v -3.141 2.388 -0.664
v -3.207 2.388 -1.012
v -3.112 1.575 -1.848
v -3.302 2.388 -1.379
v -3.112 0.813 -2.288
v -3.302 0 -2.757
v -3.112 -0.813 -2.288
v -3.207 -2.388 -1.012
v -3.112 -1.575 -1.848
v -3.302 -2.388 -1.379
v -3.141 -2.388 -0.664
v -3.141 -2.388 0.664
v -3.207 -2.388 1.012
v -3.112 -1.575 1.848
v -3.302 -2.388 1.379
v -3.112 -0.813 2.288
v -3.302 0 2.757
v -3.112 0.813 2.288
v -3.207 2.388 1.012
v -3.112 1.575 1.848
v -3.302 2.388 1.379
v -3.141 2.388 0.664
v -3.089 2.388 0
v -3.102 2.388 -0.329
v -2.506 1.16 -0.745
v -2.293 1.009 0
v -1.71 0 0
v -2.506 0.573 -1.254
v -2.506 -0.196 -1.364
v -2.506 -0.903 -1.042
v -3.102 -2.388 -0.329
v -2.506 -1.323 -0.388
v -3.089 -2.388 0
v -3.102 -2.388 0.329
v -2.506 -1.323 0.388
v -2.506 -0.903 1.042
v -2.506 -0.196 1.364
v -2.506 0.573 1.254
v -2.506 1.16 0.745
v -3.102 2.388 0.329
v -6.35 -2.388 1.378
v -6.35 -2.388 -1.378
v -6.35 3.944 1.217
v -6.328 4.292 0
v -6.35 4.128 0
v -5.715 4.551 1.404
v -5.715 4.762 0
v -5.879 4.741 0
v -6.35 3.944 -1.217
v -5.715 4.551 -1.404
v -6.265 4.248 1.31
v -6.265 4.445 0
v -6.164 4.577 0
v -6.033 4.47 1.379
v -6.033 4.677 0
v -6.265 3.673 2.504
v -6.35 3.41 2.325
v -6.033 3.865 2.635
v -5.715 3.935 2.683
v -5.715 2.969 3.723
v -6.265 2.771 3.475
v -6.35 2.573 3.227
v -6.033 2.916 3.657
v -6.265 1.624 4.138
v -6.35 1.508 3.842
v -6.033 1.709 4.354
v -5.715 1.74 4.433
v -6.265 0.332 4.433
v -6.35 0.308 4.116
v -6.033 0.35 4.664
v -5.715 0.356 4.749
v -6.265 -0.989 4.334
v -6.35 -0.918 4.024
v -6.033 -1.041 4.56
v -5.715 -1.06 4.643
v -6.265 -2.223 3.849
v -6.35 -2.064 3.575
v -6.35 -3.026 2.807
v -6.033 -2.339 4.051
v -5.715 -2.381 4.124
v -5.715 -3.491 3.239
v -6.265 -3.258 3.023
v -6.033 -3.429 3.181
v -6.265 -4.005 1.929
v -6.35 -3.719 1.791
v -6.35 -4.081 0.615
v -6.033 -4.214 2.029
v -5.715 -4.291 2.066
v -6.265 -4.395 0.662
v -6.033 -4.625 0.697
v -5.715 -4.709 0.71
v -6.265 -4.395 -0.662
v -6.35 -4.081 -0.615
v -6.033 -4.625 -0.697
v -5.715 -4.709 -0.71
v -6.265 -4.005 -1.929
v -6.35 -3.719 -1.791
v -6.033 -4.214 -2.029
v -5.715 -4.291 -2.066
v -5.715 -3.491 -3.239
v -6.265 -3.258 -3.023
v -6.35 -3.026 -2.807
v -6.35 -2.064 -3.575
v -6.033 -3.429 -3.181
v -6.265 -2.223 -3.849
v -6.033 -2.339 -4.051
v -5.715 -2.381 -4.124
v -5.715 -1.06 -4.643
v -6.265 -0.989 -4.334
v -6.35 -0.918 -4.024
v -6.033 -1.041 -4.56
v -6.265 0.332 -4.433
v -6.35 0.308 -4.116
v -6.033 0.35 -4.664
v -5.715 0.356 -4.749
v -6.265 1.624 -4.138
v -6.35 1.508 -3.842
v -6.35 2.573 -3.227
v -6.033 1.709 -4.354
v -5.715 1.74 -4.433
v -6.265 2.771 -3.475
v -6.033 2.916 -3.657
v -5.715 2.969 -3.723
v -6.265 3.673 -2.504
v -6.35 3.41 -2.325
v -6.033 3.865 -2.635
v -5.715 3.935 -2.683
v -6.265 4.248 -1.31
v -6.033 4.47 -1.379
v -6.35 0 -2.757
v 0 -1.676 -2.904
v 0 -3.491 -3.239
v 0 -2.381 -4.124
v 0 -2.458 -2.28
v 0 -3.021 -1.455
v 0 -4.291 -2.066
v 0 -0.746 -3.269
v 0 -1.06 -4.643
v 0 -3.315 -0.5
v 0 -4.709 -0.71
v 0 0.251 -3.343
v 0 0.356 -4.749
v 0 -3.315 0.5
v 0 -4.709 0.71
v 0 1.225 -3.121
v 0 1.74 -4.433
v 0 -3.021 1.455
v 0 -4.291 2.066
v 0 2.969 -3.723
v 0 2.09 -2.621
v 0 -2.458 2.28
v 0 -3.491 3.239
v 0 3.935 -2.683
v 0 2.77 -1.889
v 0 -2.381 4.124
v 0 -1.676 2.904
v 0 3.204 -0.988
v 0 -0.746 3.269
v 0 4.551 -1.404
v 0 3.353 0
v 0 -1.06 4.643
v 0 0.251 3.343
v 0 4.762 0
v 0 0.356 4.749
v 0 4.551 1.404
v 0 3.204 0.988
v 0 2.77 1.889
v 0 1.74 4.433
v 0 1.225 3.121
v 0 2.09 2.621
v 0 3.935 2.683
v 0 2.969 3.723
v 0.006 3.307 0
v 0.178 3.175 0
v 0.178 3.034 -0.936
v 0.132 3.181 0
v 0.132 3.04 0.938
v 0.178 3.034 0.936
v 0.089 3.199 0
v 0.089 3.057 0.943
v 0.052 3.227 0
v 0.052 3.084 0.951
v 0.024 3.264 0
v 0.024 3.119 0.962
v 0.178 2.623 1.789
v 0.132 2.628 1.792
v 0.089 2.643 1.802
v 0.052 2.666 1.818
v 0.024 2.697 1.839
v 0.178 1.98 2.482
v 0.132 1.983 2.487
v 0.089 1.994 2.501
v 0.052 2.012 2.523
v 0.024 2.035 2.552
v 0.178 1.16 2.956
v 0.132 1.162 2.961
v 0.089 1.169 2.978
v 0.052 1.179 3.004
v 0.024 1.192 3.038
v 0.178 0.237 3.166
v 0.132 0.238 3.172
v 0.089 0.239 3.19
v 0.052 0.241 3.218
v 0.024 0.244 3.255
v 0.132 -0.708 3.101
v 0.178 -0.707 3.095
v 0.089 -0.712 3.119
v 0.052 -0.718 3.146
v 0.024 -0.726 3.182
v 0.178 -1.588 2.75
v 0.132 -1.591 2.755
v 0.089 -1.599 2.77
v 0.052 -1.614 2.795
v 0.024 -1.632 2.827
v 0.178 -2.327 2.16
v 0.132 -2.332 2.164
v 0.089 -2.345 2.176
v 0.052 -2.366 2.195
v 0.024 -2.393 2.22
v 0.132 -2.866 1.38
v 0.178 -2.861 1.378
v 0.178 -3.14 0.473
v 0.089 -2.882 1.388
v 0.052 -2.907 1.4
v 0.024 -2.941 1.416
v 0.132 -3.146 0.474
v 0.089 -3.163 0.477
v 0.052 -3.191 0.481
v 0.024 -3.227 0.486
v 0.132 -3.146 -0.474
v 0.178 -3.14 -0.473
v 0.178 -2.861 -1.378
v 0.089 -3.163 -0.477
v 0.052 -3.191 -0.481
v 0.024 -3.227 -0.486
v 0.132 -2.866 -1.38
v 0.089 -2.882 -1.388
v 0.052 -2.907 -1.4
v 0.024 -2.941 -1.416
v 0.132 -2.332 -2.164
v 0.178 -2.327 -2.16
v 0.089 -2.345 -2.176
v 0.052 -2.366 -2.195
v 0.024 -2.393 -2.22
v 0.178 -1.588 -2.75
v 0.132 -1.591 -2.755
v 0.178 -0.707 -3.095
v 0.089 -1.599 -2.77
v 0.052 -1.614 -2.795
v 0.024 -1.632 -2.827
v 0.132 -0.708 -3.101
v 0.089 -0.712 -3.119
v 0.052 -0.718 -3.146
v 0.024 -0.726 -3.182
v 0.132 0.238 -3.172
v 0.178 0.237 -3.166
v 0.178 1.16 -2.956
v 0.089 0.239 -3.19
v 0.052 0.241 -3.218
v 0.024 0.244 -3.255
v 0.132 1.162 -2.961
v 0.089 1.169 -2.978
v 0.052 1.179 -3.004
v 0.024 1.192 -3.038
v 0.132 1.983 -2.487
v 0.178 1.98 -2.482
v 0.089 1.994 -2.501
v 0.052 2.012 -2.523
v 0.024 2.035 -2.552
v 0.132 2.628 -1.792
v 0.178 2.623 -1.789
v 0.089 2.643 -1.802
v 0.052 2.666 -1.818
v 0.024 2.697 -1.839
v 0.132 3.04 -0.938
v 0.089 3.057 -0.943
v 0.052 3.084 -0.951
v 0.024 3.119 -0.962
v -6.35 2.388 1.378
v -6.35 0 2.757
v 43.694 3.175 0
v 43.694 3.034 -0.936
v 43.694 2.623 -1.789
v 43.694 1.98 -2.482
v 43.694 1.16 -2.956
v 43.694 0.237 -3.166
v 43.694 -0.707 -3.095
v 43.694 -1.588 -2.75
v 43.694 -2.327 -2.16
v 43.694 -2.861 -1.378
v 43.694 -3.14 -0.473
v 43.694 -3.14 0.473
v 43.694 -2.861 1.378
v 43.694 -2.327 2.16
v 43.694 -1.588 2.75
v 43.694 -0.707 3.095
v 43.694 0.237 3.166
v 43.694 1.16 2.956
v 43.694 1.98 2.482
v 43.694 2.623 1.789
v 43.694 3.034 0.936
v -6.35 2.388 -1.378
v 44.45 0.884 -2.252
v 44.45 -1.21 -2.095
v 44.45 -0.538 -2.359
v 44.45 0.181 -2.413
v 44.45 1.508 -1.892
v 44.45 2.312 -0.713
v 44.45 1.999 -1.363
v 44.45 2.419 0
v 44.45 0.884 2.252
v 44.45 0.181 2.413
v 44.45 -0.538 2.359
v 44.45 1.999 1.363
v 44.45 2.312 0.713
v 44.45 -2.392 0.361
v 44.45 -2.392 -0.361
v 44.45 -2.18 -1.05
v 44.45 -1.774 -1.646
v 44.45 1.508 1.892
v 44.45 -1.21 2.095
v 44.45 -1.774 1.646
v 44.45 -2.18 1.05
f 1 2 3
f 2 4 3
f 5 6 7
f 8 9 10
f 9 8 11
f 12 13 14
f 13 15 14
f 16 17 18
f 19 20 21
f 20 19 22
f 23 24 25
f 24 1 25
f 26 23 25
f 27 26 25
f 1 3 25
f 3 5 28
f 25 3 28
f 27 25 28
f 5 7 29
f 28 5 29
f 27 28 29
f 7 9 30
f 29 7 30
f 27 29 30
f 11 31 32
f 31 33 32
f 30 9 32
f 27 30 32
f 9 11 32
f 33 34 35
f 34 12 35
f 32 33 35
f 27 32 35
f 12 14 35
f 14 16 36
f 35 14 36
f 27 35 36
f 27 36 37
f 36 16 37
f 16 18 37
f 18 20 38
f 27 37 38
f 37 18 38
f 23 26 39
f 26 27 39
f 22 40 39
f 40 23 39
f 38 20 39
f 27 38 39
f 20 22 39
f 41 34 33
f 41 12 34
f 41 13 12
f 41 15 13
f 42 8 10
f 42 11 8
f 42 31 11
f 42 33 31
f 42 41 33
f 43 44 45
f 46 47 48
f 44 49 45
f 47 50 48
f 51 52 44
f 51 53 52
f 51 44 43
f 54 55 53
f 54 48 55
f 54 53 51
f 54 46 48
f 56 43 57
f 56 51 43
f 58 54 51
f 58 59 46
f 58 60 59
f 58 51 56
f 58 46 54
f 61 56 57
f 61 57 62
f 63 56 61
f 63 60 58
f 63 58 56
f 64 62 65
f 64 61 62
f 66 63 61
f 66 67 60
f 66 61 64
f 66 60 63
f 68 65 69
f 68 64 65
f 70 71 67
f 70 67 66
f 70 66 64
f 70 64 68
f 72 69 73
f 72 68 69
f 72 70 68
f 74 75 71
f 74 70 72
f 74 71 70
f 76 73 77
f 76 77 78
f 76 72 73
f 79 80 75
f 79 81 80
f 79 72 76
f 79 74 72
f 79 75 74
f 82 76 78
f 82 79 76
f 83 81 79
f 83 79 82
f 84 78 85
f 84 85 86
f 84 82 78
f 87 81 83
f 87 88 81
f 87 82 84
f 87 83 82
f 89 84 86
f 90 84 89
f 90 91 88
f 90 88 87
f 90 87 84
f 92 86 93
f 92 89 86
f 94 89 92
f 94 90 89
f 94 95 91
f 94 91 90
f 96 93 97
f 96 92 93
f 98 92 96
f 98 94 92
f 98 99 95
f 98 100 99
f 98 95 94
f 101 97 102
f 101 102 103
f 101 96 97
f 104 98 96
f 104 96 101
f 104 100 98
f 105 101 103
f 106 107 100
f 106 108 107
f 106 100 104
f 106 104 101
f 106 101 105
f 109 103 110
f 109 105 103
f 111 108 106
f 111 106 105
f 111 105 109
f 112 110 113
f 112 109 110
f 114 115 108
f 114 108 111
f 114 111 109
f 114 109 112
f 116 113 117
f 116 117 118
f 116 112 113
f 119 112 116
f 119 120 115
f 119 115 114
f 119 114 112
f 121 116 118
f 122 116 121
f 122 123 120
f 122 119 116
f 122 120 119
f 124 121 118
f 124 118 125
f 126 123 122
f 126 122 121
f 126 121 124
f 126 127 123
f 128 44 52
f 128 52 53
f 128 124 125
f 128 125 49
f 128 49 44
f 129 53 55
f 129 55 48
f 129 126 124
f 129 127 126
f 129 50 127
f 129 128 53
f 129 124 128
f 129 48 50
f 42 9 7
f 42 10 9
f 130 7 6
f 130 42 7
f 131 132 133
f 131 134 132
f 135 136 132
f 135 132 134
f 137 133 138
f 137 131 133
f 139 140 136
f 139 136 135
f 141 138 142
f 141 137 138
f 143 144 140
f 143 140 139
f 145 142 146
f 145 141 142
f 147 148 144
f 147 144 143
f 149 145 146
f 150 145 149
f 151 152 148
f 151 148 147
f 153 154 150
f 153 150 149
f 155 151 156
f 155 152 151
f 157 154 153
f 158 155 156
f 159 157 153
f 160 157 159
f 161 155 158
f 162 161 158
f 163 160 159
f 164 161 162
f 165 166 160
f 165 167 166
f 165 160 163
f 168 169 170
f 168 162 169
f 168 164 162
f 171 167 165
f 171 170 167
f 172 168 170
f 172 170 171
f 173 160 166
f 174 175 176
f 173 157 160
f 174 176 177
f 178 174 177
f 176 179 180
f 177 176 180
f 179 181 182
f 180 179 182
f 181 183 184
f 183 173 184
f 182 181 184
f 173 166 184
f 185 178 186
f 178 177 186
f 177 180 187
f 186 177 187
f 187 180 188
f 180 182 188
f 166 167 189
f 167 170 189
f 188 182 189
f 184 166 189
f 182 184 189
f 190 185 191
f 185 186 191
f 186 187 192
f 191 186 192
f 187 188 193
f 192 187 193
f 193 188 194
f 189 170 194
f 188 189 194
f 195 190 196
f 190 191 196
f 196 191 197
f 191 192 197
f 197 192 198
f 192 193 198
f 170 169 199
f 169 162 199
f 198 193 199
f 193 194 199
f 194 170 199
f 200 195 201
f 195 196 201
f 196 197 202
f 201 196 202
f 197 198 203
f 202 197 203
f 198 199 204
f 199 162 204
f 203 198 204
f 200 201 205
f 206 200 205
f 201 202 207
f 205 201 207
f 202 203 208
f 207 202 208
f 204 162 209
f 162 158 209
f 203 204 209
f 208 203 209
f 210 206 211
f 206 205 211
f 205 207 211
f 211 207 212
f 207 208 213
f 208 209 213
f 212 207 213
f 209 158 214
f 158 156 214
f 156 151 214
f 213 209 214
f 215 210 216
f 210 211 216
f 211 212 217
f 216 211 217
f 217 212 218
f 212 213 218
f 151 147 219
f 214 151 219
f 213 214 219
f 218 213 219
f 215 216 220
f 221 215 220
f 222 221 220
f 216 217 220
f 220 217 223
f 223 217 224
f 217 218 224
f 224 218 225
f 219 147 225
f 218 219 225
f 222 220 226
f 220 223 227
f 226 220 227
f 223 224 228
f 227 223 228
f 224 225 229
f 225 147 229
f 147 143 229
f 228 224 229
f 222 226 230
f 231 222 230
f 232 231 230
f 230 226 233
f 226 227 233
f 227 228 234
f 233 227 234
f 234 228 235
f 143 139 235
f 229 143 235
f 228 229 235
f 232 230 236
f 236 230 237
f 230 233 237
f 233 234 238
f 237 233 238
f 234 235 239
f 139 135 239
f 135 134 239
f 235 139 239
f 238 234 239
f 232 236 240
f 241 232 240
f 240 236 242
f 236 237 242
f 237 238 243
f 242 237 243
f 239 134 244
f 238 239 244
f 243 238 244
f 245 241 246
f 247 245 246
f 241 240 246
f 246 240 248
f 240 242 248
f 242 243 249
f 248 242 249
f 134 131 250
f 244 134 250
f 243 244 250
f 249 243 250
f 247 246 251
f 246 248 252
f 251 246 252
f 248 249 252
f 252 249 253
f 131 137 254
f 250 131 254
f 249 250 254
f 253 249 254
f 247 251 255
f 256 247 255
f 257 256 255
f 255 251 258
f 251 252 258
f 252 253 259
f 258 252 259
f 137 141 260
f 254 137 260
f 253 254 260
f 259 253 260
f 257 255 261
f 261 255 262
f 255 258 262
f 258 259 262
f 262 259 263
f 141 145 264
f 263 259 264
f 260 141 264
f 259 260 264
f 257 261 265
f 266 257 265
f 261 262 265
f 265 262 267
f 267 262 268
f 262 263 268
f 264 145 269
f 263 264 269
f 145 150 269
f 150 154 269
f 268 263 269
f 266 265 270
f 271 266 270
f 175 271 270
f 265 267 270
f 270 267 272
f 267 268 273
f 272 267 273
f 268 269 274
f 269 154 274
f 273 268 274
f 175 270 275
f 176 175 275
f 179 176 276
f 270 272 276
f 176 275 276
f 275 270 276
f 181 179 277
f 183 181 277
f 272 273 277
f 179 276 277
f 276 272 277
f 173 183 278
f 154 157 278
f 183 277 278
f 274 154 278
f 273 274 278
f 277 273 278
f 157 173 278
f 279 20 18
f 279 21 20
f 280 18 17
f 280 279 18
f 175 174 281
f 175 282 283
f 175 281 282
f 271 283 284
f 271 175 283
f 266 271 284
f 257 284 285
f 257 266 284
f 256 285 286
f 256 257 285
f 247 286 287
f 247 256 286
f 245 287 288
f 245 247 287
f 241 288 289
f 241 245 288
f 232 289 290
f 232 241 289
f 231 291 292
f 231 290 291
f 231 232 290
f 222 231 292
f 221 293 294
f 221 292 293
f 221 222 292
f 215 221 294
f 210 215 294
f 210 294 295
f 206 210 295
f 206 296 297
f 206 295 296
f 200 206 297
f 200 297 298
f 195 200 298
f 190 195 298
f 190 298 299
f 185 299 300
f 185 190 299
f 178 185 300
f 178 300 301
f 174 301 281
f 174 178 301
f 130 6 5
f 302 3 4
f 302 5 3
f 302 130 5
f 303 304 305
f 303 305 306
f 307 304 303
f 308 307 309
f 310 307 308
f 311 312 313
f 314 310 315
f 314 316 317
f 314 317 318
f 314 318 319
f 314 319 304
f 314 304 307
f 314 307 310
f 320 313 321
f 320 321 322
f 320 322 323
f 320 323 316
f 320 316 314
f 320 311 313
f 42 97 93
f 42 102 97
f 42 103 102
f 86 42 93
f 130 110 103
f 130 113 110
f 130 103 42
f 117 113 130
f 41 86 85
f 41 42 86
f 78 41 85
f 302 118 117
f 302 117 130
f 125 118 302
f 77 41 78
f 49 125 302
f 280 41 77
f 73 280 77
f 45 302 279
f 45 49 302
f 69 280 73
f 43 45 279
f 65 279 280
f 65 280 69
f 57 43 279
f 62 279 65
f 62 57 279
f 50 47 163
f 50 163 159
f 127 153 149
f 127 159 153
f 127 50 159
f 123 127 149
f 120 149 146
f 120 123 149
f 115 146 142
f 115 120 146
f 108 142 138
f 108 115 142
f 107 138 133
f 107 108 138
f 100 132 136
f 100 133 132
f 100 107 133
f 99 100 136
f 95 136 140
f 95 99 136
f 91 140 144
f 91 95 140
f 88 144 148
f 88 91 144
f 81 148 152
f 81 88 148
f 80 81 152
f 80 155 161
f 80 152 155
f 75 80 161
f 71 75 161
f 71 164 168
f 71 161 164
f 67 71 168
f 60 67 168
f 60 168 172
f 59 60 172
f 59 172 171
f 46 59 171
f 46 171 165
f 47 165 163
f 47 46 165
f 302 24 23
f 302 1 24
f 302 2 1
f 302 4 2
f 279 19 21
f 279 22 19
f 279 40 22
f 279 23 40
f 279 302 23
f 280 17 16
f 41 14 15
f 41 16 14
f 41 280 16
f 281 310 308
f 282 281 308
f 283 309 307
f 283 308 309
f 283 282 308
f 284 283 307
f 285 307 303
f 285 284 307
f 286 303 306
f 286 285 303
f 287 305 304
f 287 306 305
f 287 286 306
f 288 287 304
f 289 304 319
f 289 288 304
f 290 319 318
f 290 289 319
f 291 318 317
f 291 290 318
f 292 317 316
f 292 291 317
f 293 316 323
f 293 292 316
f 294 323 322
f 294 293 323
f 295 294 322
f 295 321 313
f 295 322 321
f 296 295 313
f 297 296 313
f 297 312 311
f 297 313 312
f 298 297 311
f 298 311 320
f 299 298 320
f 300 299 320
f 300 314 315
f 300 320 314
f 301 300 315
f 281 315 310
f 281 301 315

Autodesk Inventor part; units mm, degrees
ref_plane "YZ Plane" through (0, 0, 0) normal (1, 0, 0) x (0, 1, 0)
ref_plane "XZ Plane" through (0, 0, 0) normal (0, 1, 0) x (-1, 0, 0)
sketch "Sketch1" plane through (0, 0, 0) normal (0, 0, 1) x (1, 0, 0)
  line L0 (-1.7103, 0) -> (44.45, 0)
  line L1 (44.45, 0) -> (44.45, 3.175)
  line L2 (44.45, 3.175) -> (12.7, 3.175)
  line L3 (12.7, 3.175) -> (9.5249, 3.175)
  line L4 (9.5249, 3.175) -> (0, 3.175)
  line L5 (0, 3.175) -> (0, 4.7625)
  line L6 (0, 4.7625) -> (-6.35, 4.7625)
  line L7 (-6.35, 4.7625) -> (-6.35, 2.757)
  line L8 (-6.35, 2.757) -> (-3.302, 2.757)
  line L9 (-3.302, 2.757) -> (-1.7103, 0)
  line L10 (-16.51, 0) -> (54.61, 0) projected
  line L11 (0, -0.9525) -> (0, 5.715) projected
  line L12 (12.7, 3.175) -> (0, 3.175) construction
  dimension "d1" = 31.75
  dimension "d2" = 3.1751
  dimension "d3" = 6.35
  dimension "d4" = 3.048
  dimension "d5" = 60
  dimension "d6" = 6.35
  dimension "d7" = 6.35
  dimension "d8" = 5.5139
  dimension "d9" = 9.525
  dimension "d26" = 44.45
revolve "Body" add sketch "Sketch1" angle 360 about axis through (-1.7103, 0, 0) along (1, 0, 0)
sketch "Sketch2" plane through (-6.35, 0, 0) normal (-1, 0, 0) x (0, 0, 1)
  circle A0 centre (0, 0) radius 2.757 projected
  line L0 (0, -6.6675) -> (0, 6.6675) projected
  line L1 (-6.6675, 0) -> (6.6675, 0) projected
  line L2 (2.757, 0) -> (1.3785, -2.3876)
  line L3 (1.3785, -2.3876) -> (-1.3785, -2.3876)
  line L4 (-1.3785, -2.3876) -> (-2.757, 0)
  line L5 (-2.757, 0) -> (-1.3785, 2.3876)
  line L6 (-1.3785, 2.3876) -> (1.3785, 2.3876)
  line L7 (1.3785, 2.3876) -> (2.757, 0)
extrude "Slot" add sketch "Sketch2" against normal up to next contours L7 A0 | A0 L2 | L6 L0 A0 | A0 L0 L3 | L0 L6 A0 | A0 L3 L0 | L4 A0 | A0 L5
fillet "Fillet1" radius 0.635 1 edges at (-6.35, -4.7625, 0)
thread "Thread" size "1/4-20 UNC" class "2A" standard "ANSI Unified Screw Threads" length 31.75
chamfer "Chamfer1" distance 0.7556 distance2 0.7556 1 edges at (44.45, -3.175, 0) measured on face at (44.45, 0.6012, -0.3644)
ref_plane "Work Plane1" through (29, 0, 0) normal (0, -1, 0) x (1, 0, 0)
fillet "Fillet2" radius 0.1778 1 edges at (0, -3.175, 0)
equation "\"d1\" = GEL"
equation "\"d3\" = KOH"
equation "\"d4\" = INTI"
equation "\"d6\" = GD"
equation "\"d7\" = BDM"
equation "\"d8\" = 1.1547 * SW"
equation "\"d9\" = KOD"
equation "\"d26\" = NLG"
equation "\"d30\" = R"
equation "\"d17\" = RR"
equation "\"d13\" = GEL"
equation "\"d15\" = -0.5 * SPD + 0.5 * GD"
equation "\"d16\" = GUL"
equation "\"GD\" = 6.35"
equation "\"NLG\" = 44.45"
equation "\"GEL\" = 31.75"
equation "\"KOD\" = 9.525"
equation "\"KOH\" = 6.35"
equation "\"INTI\" = 3.048"
equation "\"GAL\" = 3.175"
equation "\"GUL\" = 0.75565"
equation "\"BDM\" = 6.35"
equation "\"SW\" = 4.7752"
equation "\"RR\" = 0.635"
equation "\"SPD\" = 4.8387"
equation "\"R\" = 0.1778"
equation "\"PHH\" = 0.2032"
equation "\"GD1\" = SPD"
equation "\"THREADDIA\" = 6.35"
equation "\"FAWI\" = 45deg"
equation "\"KOH1\" = 5.715"
equation "\"NND\" = 6.35"
equation "\"TOA\" = 30deg"
equation "\"E0\" = 1.155 * SW"
properties part number "am-1058" material "Steel, Mild"
